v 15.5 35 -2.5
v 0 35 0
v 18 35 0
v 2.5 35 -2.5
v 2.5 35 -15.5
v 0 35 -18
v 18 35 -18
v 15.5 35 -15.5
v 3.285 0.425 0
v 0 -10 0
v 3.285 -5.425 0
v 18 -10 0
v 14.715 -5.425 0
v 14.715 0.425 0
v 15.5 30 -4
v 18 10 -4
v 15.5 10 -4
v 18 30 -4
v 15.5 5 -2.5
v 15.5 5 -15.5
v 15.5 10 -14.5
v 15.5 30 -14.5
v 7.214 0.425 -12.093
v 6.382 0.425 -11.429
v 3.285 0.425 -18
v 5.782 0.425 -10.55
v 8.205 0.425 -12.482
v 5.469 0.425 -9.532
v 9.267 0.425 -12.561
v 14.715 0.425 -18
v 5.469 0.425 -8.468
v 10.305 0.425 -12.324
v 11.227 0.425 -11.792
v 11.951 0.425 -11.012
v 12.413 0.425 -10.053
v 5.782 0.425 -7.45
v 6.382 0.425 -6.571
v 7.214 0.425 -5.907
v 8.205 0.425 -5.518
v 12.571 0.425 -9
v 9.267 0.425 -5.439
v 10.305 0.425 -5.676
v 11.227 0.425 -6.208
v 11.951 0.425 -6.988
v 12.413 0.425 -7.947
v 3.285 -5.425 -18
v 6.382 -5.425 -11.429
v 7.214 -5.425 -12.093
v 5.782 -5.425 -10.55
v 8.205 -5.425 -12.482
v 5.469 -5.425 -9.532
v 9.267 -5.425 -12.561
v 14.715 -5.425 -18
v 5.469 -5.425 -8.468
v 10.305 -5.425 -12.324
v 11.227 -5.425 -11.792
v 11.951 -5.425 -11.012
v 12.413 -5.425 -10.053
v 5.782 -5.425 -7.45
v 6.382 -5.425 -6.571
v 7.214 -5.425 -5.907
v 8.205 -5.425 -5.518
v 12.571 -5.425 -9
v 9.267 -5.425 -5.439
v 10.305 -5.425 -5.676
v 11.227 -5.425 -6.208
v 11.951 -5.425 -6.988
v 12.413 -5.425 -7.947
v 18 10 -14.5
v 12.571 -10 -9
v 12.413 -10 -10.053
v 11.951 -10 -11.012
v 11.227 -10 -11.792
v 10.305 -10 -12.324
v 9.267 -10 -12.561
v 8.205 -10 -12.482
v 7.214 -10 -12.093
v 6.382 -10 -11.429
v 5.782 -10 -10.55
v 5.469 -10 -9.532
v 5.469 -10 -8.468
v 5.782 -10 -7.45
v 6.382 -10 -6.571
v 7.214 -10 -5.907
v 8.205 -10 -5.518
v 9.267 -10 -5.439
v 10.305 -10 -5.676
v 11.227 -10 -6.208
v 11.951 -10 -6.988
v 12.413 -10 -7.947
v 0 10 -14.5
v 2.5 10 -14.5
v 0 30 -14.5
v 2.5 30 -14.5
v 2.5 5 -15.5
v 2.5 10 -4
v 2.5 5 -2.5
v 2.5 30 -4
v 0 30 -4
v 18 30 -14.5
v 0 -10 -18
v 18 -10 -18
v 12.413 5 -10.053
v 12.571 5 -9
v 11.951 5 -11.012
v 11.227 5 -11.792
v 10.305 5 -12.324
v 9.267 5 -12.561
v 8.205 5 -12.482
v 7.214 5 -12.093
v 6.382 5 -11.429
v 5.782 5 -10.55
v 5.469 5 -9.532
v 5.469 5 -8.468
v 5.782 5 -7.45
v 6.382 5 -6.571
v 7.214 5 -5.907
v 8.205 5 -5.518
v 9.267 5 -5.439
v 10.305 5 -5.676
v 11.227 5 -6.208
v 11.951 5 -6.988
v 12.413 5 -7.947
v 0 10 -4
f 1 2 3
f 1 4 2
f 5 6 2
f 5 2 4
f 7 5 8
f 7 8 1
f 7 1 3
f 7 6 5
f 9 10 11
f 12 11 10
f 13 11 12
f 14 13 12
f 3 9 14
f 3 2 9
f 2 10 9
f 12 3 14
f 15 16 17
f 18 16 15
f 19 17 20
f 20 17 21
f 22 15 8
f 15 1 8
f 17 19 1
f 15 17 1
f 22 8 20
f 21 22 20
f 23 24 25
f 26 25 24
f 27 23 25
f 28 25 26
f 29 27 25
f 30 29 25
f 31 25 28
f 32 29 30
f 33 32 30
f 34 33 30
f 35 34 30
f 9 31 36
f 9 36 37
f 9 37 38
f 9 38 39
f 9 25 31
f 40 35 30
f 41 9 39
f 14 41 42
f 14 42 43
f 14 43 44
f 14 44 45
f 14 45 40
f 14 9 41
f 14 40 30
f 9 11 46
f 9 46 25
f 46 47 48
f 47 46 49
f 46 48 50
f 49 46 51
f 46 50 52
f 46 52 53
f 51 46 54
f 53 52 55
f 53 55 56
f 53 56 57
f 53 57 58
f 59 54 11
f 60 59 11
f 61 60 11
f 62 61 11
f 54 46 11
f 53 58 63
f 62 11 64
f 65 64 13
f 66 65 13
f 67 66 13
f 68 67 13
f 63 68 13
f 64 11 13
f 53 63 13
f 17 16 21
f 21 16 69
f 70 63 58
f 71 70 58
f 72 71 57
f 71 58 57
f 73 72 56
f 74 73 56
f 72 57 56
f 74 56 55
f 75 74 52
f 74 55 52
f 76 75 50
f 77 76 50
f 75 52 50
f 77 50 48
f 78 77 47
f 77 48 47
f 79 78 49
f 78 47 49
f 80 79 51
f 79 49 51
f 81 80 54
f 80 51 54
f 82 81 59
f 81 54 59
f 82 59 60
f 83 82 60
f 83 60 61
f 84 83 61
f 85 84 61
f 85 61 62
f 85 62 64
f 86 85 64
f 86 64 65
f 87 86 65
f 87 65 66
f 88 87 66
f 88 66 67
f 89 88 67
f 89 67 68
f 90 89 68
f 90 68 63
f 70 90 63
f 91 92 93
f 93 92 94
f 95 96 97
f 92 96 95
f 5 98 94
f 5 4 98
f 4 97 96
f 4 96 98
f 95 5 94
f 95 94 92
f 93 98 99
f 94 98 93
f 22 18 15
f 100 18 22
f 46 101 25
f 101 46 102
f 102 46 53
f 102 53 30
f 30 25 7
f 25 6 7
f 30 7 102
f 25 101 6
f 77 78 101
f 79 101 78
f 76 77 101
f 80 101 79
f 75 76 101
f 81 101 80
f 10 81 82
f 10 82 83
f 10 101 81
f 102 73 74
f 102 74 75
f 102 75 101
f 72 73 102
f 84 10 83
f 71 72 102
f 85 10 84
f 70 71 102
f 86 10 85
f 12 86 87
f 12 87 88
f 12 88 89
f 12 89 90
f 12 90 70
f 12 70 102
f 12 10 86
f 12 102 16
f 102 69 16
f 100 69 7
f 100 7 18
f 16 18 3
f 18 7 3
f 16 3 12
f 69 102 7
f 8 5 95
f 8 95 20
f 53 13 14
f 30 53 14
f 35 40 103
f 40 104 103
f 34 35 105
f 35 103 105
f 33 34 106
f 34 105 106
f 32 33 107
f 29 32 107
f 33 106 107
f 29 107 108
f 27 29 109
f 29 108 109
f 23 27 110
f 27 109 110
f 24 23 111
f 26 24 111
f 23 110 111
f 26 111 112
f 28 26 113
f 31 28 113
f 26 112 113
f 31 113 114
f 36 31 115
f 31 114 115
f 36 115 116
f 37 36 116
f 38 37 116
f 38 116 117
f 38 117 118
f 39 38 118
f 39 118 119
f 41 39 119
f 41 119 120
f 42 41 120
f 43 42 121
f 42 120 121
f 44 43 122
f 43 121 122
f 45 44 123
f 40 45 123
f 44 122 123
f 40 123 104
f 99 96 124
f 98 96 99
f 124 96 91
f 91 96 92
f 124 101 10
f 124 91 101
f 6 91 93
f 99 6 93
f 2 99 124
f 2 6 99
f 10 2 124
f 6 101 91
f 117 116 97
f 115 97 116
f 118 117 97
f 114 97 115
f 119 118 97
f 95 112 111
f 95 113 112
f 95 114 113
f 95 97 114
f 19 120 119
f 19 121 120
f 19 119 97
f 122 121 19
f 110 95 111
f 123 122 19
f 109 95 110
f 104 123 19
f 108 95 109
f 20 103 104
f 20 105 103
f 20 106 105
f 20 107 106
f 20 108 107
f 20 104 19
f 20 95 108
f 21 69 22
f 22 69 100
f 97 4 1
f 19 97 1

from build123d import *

# Parameters (mm, degrees)
SKETCH1_W                   = 18
SKETCH1_H                   = 18
BOSS_EXTRUDE1_DEPTH         = 35
SKETCH5_W                   = 13
SKETCH5_H                   = 13
CUT_EXTRUDE1_DEPTH          = 30
SKETCH7_W                   = 10.5
SKETCH7_H                   = 20
CUT_EXTRUDE3_DEPTH          = 44.278170017
SKETCH8_W                   = 18
SKETCH8_H                   = 18
BOSS_EXTRUDE2_DEPTH         = 10
SKETCH9_W                   = 11.43
SKETCH9_H                   = 5.85
CUT_EXTRUDE4_DEPTH          = 44.278170017
F_1_4_CLEARANCE_HOLE1_D     = 7.14248
F_1_4_CLEARANCE_HOLE1_DEPTH = 15
F_1_4_CLEARANCE_HOLE1_TIP   = 2.145817477


with BuildPart() as part:
    # Sketch1 → Boss-Extrude1 (new body)
    with BuildSketch(Plane(origin=(0, 0, 0), x_dir=(1, 0, 0), z_dir=(0, 1, 0))):
        with Locations((9, 9)):
            Rectangle(SKETCH1_W, SKETCH1_H)
    extrude(amount=BOSS_EXTRUDE1_DEPTH)

    # Sketch5 → Cut-Extrude1 (cut)
    with BuildSketch(Plane(origin=(0, 35, 0), x_dir=(1, 0, 0), z_dir=(0, 1, 0))):
        with Locations((9, 9)):
            Rectangle(SKETCH5_W, SKETCH5_H)
    extrude(amount=-CUT_EXTRUDE1_DEPTH, mode=Mode.SUBTRACT)

    # Sketch7 → Cut-Extrude3 (cut, through all)
    with BuildSketch(Plane(origin=(18, 0, 0), x_dir=(0, 0, -1), z_dir=(1, 0, 0))):
        with Locations((9.25, 20)):
            Rectangle(SKETCH7_W, SKETCH7_H)
    extrude(amount=-CUT_EXTRUDE3_DEPTH, mode=Mode.SUBTRACT)

    # Sketch8 → Boss-Extrude2 (add)
    with BuildSketch(Plane.XZ):
        with Locations((9, -9)):
            Rectangle(SKETCH8_W, SKETCH8_H)
    extrude(amount=BOSS_EXTRUDE2_DEPTH)

    # Sketch9 → Cut-Extrude4 (cut, through all)
    with BuildSketch(Plane.XY):
        with Locations((9, -2.5)):
            Rectangle(SKETCH9_W, SKETCH9_H)
    extrude(amount=-CUT_EXTRUDE4_DEPTH, mode=Mode.SUBTRACT)

    # 1/4 Clearance Hole1
    with Locations(Plane(origin=(0, -10, 0), x_dir=(-1, 0, 0), z_dir=(0, -1, 0))):
        with Locations((-9, 9)):
            Hole(F_1_4_CLEARANCE_HOLE1_D / 2, depth=F_1_4_CLEARANCE_HOLE1_DEPTH)
            with Locations((0, 0, -(F_1_4_CLEARANCE_HOLE1_DEPTH + F_1_4_CLEARANCE_HOLE1_TIP / 2))):  # 118° drill point
                Cone(0, F_1_4_CLEARANCE_HOLE1_D / 2, F_1_4_CLEARANCE_HOLE1_TIP, mode=Mode.SUBTRACT)


solid = part.part
